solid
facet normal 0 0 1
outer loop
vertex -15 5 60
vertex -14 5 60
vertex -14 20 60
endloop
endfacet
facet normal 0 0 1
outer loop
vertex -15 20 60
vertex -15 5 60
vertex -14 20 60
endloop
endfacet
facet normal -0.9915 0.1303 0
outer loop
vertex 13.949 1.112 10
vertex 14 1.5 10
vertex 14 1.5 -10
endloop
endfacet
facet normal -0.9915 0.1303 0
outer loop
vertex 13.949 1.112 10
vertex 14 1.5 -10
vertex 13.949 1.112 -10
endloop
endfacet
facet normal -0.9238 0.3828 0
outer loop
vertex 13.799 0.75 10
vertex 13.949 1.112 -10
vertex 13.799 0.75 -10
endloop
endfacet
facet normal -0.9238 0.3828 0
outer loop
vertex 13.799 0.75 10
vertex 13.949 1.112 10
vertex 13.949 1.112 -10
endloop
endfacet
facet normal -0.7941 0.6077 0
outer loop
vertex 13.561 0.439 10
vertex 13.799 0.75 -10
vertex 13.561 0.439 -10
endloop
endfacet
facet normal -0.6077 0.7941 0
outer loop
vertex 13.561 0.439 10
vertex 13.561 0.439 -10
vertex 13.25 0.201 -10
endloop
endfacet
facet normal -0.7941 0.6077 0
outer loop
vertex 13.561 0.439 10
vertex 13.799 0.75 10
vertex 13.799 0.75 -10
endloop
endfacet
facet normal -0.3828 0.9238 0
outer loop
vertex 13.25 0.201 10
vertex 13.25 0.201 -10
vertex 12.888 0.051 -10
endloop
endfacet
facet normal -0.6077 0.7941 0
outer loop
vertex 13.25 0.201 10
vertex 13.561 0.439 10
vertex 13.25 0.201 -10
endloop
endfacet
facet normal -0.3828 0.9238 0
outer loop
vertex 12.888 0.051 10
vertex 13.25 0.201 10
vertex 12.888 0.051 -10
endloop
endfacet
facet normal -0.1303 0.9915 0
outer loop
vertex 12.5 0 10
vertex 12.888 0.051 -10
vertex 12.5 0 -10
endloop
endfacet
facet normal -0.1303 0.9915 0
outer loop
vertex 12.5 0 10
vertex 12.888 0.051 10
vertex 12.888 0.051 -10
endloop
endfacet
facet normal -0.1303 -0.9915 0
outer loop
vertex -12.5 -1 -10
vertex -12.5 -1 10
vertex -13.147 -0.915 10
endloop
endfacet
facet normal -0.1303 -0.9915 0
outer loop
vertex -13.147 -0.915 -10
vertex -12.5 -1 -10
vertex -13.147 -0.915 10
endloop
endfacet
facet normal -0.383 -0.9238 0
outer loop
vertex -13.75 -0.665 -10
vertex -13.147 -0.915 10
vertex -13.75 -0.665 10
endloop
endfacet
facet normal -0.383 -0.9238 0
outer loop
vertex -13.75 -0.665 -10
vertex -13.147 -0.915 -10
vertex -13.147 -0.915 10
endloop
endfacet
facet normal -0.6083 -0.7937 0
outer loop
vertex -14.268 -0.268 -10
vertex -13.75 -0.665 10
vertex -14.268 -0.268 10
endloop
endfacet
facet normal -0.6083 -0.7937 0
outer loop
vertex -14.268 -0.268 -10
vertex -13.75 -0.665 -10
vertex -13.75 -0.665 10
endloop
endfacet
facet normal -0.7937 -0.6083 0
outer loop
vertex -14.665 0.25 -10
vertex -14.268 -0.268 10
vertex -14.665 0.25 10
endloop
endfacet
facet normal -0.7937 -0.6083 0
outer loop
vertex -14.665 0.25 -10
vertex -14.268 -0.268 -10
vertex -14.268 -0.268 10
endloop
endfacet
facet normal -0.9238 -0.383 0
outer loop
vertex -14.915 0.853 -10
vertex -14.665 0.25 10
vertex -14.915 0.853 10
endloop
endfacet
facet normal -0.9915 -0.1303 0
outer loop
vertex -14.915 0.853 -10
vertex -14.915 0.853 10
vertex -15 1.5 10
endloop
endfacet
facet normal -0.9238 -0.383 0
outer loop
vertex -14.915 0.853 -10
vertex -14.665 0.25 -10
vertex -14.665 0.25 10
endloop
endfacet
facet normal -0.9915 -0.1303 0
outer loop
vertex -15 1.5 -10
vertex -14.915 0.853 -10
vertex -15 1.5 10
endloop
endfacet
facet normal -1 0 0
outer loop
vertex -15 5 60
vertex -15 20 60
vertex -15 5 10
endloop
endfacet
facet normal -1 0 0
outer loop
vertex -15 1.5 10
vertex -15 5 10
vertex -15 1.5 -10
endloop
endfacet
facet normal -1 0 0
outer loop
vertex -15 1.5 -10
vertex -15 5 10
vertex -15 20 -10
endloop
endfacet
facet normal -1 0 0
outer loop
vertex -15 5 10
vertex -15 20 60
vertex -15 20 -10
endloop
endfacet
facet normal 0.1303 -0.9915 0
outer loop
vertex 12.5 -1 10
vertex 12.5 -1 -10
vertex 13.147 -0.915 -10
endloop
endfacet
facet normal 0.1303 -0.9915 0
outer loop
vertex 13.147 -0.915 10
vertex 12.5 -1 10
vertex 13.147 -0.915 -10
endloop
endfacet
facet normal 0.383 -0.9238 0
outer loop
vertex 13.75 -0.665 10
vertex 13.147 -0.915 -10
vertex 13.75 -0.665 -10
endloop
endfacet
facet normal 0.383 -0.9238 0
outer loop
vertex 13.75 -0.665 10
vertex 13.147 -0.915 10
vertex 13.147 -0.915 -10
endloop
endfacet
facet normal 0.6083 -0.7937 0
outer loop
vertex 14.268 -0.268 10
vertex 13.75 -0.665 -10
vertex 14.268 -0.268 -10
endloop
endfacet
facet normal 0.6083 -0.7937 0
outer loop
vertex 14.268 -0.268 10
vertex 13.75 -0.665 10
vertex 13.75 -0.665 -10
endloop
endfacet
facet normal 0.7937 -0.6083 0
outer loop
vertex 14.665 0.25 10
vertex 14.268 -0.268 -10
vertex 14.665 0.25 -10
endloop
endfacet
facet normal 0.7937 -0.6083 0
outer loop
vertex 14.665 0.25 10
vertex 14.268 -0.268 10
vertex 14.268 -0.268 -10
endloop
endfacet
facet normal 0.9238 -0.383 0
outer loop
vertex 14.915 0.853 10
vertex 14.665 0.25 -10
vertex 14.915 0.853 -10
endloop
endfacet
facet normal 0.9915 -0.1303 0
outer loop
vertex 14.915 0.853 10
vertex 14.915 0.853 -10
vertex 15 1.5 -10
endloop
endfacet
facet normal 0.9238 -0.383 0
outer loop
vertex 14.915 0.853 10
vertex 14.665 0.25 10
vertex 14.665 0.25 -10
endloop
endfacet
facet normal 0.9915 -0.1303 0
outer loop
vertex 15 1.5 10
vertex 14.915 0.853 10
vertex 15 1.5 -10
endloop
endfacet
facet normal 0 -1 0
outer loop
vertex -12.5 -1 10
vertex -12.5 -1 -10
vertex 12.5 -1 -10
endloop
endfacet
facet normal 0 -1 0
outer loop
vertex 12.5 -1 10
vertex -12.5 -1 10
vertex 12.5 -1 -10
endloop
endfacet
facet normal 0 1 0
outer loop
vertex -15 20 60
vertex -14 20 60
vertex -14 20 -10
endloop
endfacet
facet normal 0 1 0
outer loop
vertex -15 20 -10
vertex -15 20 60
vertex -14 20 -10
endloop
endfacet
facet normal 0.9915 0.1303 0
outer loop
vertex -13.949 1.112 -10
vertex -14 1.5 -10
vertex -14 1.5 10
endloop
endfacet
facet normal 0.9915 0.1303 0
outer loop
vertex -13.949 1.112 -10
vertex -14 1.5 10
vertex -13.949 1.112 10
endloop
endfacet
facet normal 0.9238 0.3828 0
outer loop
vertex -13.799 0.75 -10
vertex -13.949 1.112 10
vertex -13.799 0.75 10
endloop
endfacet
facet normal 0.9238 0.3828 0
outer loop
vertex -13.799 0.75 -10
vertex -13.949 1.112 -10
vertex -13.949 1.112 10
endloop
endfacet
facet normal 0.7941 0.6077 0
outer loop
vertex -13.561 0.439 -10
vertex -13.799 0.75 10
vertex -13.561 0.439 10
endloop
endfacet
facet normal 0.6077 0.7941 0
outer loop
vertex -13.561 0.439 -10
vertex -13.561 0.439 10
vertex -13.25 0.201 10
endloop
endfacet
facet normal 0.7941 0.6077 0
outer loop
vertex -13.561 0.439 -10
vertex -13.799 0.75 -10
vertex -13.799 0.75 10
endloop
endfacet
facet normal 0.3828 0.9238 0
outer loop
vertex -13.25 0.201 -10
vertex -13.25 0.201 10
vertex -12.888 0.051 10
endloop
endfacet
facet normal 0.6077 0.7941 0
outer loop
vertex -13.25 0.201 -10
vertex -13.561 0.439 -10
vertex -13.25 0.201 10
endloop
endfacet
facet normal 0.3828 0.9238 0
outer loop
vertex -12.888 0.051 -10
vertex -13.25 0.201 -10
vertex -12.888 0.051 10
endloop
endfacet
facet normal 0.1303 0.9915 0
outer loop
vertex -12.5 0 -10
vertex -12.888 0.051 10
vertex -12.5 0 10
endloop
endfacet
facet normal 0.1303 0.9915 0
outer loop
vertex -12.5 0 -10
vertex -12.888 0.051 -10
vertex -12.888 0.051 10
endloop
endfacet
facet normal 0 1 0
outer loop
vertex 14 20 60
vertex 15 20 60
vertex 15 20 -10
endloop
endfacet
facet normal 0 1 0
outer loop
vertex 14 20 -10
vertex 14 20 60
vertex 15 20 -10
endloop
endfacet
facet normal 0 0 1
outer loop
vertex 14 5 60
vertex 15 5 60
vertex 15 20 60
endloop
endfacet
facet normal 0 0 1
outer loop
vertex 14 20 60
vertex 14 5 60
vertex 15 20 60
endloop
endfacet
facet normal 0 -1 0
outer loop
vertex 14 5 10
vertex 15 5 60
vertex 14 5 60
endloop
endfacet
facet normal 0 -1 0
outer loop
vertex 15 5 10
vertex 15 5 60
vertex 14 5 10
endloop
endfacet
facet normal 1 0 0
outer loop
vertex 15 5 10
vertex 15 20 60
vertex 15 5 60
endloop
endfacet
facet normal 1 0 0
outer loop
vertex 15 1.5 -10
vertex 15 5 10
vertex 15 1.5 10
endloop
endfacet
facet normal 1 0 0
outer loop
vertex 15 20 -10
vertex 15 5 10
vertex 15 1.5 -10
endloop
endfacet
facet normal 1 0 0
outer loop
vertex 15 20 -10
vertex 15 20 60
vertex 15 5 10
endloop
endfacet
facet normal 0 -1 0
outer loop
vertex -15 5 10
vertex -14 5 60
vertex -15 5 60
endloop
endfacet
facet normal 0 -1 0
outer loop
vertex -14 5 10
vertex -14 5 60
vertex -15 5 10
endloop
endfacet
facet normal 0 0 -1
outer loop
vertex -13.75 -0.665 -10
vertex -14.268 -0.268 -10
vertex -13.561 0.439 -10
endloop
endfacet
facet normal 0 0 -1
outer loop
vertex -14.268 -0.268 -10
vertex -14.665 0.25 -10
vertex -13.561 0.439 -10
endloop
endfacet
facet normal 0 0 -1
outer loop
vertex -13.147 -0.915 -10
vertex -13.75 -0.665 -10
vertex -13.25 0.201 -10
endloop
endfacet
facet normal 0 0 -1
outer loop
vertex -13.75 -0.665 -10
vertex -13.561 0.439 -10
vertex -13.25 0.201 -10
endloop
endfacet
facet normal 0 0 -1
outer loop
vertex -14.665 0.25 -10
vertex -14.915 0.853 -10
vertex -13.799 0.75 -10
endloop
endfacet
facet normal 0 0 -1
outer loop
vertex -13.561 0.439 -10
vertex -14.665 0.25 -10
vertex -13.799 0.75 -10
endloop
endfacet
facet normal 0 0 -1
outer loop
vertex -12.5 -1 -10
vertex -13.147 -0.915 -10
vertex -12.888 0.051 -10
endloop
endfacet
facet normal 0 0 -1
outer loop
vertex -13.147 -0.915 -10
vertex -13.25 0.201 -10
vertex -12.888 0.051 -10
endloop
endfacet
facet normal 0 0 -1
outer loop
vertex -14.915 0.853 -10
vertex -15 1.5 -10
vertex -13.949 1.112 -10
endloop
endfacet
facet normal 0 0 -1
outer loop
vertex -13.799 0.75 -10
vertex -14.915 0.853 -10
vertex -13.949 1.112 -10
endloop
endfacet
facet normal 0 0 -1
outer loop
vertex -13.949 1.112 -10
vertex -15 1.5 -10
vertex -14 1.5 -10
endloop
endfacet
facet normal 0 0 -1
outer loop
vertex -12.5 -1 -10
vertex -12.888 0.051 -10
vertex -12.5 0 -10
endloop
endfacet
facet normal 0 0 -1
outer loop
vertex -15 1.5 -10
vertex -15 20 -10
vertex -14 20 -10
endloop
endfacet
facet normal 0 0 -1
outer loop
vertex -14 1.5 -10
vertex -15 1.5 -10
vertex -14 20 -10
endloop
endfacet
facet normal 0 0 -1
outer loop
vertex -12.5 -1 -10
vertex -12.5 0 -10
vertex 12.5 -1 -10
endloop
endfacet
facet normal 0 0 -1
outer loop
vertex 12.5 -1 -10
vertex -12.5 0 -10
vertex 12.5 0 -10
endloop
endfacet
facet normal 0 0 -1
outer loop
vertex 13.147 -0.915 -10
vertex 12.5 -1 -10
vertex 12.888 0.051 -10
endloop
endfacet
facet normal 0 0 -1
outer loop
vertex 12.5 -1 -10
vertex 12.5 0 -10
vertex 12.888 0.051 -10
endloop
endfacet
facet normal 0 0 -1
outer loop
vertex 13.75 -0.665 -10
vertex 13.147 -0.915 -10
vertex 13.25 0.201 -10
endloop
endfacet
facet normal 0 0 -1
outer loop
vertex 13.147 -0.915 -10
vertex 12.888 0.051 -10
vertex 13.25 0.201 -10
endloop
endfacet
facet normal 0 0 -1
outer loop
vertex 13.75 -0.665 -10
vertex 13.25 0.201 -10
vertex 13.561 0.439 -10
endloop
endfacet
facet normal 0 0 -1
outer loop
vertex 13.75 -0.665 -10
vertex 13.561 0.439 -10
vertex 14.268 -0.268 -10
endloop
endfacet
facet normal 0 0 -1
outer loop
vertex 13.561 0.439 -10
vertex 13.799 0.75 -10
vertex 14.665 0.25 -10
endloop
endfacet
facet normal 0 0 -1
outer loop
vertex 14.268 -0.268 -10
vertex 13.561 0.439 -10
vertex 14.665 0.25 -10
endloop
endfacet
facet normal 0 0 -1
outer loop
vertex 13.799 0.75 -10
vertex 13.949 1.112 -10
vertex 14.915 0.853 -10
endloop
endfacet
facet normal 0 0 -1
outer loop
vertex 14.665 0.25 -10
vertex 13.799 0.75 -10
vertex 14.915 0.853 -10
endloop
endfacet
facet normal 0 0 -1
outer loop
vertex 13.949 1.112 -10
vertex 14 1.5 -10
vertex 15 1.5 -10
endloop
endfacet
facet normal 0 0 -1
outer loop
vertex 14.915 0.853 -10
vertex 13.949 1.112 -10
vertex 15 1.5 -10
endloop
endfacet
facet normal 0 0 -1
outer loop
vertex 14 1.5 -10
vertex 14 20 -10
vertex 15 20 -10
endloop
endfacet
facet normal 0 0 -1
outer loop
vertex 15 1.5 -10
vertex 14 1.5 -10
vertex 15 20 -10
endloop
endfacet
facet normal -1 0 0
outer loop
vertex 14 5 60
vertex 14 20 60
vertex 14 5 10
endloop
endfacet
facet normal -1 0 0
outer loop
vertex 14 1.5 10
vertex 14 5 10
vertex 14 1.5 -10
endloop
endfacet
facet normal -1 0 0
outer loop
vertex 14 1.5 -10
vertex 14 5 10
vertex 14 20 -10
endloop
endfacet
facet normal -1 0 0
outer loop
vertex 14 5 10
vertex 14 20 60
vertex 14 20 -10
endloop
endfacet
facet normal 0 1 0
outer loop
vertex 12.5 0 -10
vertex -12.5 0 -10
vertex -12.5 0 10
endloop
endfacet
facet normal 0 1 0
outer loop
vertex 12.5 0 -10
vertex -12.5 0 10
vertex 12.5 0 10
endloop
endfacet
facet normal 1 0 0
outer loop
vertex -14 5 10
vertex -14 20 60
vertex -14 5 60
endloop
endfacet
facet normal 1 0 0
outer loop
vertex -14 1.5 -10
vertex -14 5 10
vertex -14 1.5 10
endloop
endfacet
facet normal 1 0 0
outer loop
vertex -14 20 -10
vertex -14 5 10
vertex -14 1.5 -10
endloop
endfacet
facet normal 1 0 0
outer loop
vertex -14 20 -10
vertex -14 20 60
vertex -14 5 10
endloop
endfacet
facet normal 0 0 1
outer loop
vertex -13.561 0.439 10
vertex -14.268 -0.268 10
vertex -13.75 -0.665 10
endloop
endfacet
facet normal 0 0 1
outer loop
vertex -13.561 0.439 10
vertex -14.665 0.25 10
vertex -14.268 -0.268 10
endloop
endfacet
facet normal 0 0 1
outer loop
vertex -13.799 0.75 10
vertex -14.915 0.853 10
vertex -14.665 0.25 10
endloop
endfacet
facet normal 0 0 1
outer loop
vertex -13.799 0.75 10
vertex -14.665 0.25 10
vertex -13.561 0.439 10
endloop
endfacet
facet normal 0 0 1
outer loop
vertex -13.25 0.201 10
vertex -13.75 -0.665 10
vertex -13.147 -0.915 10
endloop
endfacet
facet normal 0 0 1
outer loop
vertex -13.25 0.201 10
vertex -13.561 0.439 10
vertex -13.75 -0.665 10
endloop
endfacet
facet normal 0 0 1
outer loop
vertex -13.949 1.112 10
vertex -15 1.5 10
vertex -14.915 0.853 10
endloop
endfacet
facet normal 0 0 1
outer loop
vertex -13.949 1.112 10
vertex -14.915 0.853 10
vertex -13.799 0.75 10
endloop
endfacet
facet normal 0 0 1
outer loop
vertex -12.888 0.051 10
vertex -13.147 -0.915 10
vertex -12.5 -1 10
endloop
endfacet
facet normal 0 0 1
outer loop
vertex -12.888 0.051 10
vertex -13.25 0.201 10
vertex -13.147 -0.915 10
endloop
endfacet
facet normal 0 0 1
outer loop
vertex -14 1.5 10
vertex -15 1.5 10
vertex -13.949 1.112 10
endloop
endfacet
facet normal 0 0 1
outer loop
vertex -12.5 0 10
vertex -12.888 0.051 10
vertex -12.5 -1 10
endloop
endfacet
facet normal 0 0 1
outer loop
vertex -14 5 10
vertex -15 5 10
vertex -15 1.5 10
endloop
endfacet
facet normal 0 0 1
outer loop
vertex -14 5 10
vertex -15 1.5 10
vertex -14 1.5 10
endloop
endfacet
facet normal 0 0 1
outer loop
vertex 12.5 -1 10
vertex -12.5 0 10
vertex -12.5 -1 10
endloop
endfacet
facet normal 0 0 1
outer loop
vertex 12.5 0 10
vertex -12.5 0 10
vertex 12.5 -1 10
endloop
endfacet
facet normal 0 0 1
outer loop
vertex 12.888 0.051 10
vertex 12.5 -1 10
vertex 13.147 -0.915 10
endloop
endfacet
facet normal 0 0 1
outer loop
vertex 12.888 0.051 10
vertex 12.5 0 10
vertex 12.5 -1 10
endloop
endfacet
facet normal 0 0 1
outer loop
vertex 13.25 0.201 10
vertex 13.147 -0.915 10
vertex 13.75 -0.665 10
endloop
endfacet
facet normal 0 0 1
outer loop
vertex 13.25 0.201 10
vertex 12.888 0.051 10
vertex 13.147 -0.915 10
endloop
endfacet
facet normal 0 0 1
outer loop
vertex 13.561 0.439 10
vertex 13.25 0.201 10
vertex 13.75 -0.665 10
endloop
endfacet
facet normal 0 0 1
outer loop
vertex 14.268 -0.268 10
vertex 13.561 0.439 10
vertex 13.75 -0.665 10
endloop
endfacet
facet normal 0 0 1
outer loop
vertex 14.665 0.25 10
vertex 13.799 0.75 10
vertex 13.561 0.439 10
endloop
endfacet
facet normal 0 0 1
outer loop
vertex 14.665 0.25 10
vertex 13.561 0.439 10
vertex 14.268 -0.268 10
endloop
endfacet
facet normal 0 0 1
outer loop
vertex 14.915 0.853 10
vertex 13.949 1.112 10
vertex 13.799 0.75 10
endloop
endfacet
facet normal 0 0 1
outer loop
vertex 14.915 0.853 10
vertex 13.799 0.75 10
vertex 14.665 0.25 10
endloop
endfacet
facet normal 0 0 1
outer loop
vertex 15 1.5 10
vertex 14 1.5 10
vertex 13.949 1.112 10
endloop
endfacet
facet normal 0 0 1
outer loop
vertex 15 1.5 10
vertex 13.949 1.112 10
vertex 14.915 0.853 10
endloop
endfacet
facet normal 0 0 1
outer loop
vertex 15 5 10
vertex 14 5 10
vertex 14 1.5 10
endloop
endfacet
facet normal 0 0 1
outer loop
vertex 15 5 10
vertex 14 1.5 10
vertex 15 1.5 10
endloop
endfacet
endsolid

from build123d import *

# Parameters (mm, degrees)
SKETCH1_W          = 25
SKETCH1_H          = 20
BASE_FLANGE1_DEPTH = 1
EDGE_FLANGE1_DEPTH = 20
EDGE_FLANGE2_DEPTH = 20
SKETCH15_W         = 50
SKETCH15_H         = 15
TAB1_DEPTH         = 1
SKETCH18_W         = 50
SKETCH18_H         = 15
TAB2_DEPTH         = 1


# Sheet-metal steps are written as plain solids
with BuildPart() as part:
    # Sketch1 → Base-Flange1 (new body)
    with BuildSketch(Plane(origin=(0, 0, 0), x_dir=(1, 0, 0), z_dir=(0, 1, 0))):
        Rectangle(SKETCH1_W, SKETCH1_H)
    extrude(amount=-BASE_FLANGE1_DEPTH)

    # Edge-Flange1 section (across the edge) → Edge-Flange1 (add)
    with BuildSketch(Plane(origin=(-14, 0, -10), x_dir=(1, 0, 0), z_dir=(0, 0, 1))):
        with BuildLine():
            Line((-1, 1.5), (-1, 20))
            Line((-1, 20), (0, 20))
            Line((0, 20), (0, 1.5))
            ThreePointArc((0, 1.5), (0.439339828, 0.439339828), (1.5, 0))
            Line((1.5, 0), (1.5, -1))
            ThreePointArc((1.5, -1), (-0.267766953, -0.267766953), (-1, 1.5))
        make_face()
    extrude(amount=EDGE_FLANGE1_DEPTH)

    # Edge-Flange2 section (across the edge) → Edge-Flange2 (add)
    with BuildSketch(Plane(origin=(14, 0, 10), x_dir=(-1, 0, 0), z_dir=(0, 0, -1))):
        with BuildLine():
            Line((-1, 1.5), (-1, 20))
            Line((-1, 20), (0, 20))
            Line((0, 20), (0, 1.5))
            ThreePointArc((0, 1.5), (0.439339828, 0.439339828), (1.5, 0))
            Line((1.5, 0), (1.5, -1))
            ThreePointArc((1.5, -1), (-0.267766953, -0.267766953), (-1, 1.5))
        make_face()
    extrude(amount=EDGE_FLANGE2_DEPTH)

    # Sketch15 → Tab1 (add)
    with BuildSketch(Plane(origin=(-14, 0, 0), x_dir=(0, 0, -1), z_dir=(1, 0, 0))):
        with Locations((-35, 12.5)):
            Rectangle(SKETCH15_W, SKETCH15_H)
    extrude(amount=-TAB1_DEPTH)

    # Sketch18 → Tab2 (add)
    with BuildSketch(Plane(origin=(15, 0, 0), x_dir=(0, 0, -1), z_dir=(1, 0, 0))):
        with Locations((-35, 12.5)):
            Rectangle(SKETCH18_W, SKETCH18_H)
    extrude(amount=-TAB2_DEPTH)


solid = part.part
